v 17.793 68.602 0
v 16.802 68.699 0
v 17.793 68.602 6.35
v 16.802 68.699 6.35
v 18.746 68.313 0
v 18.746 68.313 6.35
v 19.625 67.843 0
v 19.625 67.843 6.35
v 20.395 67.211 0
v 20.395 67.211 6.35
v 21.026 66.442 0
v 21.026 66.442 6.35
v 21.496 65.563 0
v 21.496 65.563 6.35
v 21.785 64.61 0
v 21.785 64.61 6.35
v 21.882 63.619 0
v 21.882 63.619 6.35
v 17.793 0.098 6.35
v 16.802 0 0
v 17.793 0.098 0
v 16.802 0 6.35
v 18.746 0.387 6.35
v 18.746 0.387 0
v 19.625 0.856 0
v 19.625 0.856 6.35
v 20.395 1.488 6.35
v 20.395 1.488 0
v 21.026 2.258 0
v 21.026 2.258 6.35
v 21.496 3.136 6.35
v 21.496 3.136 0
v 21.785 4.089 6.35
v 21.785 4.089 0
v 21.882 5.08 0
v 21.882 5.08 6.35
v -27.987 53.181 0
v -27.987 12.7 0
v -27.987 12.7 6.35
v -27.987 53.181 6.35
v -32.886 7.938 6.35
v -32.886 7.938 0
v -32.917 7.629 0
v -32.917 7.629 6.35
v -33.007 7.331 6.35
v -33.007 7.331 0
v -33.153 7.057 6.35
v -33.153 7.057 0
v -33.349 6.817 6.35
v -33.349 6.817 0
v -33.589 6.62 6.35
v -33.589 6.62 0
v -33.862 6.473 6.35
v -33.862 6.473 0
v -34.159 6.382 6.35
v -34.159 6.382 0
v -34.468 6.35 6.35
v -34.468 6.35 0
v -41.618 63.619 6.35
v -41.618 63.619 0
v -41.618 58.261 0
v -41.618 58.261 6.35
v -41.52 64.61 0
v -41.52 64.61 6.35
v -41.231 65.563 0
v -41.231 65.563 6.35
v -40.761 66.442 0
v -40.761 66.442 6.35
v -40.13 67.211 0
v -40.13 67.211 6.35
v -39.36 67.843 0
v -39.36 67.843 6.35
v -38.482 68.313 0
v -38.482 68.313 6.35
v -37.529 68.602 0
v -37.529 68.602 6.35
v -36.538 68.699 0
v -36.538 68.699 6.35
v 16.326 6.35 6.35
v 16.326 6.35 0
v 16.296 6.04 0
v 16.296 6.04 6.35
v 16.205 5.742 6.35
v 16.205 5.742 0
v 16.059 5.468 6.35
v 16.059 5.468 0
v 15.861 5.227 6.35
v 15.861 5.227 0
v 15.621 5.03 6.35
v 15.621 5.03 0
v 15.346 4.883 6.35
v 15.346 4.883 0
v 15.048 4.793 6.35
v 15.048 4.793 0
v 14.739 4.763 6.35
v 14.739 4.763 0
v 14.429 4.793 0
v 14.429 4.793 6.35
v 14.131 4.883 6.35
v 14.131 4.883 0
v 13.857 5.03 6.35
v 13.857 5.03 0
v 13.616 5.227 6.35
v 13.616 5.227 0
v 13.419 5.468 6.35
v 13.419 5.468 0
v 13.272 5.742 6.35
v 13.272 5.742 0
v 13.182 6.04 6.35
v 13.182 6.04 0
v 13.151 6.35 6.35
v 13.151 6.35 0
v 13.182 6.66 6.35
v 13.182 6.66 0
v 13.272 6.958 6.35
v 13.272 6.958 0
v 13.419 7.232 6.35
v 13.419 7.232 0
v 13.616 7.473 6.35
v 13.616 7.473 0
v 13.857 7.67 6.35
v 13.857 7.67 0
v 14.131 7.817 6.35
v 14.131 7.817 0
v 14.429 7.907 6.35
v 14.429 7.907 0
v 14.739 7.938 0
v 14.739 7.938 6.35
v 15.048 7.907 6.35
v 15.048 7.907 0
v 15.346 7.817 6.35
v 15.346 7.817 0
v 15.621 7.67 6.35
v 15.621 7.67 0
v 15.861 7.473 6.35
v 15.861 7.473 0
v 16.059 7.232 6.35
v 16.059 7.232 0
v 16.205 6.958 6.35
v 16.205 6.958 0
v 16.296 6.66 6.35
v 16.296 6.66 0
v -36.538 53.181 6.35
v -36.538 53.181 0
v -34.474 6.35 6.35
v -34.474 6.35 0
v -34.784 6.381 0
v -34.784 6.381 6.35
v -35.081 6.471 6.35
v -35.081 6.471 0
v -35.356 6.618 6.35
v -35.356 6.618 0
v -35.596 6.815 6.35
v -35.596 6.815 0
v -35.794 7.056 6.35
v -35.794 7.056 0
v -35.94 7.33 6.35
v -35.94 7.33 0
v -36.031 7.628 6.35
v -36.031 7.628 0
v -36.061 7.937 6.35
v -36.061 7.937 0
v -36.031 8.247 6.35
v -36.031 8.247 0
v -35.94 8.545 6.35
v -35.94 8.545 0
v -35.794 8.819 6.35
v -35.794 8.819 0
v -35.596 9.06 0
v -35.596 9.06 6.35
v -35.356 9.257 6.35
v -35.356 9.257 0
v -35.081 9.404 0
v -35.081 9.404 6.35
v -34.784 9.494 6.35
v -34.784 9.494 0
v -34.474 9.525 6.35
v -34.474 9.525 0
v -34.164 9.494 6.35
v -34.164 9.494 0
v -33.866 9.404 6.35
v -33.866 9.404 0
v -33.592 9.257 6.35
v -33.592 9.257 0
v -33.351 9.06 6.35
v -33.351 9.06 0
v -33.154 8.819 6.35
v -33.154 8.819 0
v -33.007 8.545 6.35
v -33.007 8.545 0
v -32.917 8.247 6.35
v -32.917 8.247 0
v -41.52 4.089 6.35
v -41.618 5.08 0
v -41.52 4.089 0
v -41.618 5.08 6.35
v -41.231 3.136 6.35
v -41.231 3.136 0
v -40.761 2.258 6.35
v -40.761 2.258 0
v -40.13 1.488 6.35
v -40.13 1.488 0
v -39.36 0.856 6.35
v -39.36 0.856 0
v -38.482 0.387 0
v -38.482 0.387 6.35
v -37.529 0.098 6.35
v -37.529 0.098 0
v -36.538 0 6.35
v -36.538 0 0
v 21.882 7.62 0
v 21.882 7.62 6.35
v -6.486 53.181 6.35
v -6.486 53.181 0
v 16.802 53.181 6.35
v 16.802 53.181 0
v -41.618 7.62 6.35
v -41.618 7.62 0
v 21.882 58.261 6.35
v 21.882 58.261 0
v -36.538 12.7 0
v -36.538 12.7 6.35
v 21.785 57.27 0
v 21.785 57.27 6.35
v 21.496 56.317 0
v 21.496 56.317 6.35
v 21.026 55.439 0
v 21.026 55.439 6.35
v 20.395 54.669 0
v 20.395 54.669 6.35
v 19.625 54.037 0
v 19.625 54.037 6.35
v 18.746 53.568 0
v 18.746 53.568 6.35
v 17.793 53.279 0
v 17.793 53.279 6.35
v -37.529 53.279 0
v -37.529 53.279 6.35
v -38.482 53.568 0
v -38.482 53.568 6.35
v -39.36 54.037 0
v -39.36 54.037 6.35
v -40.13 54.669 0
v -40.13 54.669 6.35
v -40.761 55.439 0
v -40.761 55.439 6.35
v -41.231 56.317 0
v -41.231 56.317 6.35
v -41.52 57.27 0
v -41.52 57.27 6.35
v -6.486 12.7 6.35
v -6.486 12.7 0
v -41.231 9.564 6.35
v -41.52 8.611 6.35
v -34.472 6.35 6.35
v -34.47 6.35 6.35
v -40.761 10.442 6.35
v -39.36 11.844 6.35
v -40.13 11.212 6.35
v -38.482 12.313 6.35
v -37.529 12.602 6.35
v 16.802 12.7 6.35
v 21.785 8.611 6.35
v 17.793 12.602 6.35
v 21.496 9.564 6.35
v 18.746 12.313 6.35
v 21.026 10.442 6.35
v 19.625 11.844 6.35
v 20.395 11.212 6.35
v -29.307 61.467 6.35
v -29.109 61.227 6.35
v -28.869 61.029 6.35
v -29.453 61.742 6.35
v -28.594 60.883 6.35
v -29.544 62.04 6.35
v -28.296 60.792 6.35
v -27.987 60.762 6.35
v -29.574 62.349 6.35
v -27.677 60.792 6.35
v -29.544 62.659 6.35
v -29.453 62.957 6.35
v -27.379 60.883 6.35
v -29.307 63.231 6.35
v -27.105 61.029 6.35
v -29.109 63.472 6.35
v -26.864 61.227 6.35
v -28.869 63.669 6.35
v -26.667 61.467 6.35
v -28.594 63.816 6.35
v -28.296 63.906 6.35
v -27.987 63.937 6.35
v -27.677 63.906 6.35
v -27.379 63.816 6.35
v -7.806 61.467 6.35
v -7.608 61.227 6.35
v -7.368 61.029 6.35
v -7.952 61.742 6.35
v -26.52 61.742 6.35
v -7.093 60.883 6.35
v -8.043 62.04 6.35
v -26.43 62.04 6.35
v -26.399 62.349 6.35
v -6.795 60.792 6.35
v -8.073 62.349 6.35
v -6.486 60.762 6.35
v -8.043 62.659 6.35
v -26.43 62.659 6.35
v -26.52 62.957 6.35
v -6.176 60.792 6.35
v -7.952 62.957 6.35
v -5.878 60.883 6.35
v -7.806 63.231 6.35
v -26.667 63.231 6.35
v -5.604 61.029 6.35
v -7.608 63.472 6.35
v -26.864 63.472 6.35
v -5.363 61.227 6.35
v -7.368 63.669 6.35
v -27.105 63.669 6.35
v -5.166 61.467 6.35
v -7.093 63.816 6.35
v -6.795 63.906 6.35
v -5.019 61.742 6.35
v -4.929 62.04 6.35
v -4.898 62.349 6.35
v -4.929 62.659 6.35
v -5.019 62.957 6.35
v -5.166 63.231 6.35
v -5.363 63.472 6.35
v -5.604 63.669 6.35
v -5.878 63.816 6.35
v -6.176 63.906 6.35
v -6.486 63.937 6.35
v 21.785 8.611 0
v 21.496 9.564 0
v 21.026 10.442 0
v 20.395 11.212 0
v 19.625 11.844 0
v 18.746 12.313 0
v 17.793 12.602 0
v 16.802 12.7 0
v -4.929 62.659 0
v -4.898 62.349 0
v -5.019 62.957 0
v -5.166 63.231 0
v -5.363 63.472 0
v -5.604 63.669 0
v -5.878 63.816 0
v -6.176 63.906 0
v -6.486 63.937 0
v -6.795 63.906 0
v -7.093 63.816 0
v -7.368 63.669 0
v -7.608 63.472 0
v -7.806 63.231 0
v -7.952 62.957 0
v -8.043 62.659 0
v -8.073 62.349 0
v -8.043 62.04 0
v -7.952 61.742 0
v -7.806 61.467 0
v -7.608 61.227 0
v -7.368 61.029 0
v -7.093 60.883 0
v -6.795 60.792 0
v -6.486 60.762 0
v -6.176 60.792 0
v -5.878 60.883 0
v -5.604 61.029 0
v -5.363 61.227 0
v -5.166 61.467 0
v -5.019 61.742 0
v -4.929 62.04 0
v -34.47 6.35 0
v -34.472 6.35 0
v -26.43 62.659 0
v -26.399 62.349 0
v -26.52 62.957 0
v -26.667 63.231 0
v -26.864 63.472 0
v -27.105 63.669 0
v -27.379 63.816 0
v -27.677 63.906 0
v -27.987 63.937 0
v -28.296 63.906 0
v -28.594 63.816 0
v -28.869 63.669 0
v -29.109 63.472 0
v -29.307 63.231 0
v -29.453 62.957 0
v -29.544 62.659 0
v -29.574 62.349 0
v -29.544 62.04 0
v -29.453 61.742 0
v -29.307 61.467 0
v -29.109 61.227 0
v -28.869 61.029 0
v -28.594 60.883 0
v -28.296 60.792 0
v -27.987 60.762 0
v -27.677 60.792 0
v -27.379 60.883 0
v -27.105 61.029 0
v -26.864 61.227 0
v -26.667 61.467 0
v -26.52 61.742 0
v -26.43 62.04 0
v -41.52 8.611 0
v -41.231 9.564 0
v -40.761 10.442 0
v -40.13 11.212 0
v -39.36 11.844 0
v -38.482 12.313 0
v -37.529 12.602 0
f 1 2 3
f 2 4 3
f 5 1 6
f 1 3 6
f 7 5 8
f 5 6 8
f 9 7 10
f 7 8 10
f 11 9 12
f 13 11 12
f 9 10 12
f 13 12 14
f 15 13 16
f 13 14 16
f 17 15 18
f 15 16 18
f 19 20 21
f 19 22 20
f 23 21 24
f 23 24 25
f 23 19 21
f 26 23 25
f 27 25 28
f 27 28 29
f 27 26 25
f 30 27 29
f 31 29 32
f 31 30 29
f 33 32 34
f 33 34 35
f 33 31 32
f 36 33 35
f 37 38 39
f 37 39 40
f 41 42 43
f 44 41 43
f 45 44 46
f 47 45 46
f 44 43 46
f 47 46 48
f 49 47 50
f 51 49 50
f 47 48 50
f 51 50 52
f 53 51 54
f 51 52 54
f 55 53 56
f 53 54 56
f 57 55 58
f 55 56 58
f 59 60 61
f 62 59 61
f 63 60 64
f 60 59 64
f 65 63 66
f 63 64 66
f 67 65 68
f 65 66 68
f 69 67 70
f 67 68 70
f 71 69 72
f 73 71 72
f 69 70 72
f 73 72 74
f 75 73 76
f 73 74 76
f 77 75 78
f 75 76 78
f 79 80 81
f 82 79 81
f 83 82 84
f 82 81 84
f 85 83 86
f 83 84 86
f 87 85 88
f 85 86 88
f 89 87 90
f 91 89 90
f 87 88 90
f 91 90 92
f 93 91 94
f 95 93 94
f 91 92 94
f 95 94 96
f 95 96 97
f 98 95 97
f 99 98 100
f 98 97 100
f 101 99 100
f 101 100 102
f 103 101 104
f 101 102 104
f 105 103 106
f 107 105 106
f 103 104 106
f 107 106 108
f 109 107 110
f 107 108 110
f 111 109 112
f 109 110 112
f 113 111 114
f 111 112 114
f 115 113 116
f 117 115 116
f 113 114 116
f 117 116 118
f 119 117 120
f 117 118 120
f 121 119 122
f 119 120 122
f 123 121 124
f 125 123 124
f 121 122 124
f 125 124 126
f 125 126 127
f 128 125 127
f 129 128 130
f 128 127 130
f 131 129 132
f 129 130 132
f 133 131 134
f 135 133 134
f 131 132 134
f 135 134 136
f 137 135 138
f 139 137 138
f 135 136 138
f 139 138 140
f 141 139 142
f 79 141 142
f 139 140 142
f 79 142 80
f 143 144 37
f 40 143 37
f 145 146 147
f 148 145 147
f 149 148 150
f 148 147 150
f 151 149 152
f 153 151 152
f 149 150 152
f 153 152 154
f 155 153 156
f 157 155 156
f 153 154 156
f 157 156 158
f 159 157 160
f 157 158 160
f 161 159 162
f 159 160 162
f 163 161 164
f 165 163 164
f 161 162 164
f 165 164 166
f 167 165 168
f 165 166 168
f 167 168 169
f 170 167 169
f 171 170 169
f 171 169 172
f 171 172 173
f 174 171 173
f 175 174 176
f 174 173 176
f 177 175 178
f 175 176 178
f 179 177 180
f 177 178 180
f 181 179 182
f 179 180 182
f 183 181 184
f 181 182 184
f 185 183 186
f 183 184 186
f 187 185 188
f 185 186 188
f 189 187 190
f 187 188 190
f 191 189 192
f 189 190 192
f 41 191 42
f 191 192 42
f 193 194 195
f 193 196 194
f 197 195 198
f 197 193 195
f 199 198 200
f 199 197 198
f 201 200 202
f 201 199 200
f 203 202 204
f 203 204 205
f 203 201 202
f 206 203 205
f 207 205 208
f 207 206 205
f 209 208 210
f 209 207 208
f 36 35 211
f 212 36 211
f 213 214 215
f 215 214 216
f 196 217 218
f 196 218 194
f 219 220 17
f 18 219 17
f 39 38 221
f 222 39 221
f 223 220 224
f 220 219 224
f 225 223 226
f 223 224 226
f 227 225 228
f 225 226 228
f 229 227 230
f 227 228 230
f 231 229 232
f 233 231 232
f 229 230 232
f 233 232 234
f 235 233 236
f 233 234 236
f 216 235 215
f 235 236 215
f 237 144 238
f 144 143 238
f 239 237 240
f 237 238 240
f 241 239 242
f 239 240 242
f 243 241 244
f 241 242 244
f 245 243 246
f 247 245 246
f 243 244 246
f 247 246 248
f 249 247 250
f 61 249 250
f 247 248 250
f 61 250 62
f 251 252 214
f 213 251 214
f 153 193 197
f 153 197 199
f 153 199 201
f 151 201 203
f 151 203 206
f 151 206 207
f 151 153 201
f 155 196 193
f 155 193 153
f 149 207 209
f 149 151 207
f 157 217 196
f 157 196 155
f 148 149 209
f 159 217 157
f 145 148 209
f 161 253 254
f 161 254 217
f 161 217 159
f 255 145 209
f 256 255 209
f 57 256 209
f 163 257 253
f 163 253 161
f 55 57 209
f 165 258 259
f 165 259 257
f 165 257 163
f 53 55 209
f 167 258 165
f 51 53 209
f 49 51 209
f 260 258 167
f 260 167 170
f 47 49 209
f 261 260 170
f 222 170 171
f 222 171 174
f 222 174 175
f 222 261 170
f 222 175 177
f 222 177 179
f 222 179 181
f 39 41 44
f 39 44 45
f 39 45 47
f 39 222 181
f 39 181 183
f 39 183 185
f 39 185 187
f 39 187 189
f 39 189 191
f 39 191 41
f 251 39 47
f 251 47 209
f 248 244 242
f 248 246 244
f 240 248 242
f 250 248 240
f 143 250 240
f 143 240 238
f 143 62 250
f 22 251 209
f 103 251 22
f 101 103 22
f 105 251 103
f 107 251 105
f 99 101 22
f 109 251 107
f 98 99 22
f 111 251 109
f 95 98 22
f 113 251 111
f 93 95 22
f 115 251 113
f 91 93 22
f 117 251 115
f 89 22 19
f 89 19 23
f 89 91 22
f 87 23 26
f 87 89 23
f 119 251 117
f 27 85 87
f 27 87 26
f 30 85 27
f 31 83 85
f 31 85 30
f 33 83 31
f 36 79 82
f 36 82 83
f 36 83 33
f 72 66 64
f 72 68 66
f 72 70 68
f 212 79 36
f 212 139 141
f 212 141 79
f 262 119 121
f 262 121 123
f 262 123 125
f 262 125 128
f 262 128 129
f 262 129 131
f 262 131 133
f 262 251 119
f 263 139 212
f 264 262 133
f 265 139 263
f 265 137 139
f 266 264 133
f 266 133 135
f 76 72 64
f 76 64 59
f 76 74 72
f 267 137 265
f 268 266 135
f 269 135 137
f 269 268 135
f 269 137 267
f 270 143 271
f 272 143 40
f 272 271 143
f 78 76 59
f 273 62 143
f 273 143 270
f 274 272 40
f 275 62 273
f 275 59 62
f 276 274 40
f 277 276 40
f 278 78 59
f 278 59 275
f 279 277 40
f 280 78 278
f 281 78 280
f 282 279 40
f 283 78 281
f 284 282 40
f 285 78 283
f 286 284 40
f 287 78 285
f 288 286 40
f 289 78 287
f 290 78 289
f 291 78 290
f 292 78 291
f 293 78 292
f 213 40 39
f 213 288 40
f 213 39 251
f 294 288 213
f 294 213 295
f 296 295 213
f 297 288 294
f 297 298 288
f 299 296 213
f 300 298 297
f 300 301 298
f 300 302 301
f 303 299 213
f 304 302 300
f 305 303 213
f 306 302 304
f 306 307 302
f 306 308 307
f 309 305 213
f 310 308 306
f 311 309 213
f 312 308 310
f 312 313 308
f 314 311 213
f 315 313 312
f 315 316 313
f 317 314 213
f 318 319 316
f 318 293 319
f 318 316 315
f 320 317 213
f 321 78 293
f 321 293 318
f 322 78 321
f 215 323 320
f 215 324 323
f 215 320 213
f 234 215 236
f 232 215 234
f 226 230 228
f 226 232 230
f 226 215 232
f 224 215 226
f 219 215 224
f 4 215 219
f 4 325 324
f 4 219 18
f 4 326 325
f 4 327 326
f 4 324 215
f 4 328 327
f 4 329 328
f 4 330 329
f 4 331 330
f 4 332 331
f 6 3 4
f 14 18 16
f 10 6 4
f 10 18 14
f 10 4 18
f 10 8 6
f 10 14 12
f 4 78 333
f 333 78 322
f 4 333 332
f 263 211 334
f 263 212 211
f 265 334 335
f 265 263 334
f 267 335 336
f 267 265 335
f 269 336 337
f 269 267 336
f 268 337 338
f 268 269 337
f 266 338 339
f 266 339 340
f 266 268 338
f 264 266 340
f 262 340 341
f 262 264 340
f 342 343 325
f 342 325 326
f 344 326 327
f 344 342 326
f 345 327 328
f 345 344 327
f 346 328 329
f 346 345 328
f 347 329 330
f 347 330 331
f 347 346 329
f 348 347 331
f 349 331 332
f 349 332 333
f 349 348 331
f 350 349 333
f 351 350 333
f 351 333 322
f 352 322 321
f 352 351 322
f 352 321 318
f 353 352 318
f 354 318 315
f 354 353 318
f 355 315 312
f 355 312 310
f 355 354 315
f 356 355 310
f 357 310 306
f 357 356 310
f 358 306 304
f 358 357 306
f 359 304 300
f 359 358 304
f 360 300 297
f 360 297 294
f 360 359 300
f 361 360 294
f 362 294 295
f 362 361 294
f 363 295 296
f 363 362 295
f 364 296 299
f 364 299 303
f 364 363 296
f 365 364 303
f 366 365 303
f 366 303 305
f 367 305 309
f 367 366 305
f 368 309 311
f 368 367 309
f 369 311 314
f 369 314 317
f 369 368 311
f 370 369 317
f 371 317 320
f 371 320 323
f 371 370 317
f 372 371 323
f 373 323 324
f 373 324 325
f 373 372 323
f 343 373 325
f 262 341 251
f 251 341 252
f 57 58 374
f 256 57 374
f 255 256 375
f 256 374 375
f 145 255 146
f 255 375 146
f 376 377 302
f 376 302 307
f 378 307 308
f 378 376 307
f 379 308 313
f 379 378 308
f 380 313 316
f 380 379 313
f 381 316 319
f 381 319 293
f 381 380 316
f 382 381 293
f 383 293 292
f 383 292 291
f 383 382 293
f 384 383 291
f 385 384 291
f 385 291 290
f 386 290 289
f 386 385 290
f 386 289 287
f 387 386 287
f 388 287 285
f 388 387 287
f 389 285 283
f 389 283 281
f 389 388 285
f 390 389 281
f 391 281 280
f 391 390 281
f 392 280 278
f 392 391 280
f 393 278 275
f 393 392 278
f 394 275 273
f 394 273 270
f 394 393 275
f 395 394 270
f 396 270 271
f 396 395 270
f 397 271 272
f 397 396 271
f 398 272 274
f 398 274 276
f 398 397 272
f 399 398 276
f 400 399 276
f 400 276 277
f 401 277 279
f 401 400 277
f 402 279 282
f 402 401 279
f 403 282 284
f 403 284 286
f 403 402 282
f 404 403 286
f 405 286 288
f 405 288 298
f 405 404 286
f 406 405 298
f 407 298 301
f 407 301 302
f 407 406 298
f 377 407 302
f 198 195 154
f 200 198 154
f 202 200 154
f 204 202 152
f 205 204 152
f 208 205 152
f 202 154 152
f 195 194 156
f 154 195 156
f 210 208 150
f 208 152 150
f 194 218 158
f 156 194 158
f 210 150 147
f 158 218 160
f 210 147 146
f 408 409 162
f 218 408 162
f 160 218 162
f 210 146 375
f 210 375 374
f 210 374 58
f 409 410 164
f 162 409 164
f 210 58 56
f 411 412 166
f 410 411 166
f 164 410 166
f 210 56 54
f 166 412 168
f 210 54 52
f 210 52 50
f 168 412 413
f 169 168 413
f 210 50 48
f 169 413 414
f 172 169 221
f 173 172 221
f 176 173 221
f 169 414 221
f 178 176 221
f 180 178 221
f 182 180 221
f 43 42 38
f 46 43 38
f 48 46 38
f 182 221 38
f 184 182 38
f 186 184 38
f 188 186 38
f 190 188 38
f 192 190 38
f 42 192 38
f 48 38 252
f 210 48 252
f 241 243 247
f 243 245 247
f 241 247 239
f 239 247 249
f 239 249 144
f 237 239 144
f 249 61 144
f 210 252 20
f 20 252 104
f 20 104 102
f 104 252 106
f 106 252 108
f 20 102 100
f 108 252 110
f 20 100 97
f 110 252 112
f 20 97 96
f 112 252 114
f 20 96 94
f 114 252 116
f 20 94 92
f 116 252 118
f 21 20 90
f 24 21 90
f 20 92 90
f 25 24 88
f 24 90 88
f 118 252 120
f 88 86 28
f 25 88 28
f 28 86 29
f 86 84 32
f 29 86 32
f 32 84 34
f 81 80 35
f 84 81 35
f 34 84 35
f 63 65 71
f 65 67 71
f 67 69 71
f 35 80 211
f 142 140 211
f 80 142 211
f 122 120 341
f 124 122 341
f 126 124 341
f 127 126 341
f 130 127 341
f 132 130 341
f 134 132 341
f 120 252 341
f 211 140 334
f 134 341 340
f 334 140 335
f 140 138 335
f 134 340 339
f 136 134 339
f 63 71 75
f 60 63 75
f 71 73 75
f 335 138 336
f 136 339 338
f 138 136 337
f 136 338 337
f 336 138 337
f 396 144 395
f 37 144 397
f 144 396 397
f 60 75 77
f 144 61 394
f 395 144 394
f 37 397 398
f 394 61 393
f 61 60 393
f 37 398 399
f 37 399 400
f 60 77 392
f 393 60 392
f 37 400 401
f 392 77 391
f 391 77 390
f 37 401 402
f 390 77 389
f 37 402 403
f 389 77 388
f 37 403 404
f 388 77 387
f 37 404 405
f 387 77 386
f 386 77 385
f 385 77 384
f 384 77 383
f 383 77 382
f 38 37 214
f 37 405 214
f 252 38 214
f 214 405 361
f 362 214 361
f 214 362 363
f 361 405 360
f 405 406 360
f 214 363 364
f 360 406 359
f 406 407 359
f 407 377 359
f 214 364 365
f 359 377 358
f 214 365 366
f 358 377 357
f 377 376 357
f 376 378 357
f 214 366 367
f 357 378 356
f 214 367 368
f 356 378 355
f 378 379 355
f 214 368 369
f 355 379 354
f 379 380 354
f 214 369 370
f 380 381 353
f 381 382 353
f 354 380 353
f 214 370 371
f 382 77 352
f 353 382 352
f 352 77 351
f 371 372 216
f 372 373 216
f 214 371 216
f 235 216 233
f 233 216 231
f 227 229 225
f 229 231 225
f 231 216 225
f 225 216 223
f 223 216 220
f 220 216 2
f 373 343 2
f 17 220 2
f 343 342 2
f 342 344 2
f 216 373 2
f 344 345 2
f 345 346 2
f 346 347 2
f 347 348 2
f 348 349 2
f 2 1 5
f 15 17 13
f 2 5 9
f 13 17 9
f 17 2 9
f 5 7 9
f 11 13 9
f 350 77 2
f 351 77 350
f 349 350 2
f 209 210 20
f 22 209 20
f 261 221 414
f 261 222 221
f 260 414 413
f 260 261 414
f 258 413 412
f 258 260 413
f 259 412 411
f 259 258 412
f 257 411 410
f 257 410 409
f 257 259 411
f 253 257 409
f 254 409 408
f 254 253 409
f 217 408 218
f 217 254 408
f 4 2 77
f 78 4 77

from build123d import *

# Parameters (mm, degrees)
F0_R     = 1.5875
F0_W     = 21.5011
F0_H     = 40.48125
F1_DEPTH = 6.35
F2_R     = 5.08


with BuildPart() as f1:
    # F0 (on Top) → F1 (new body)
    with BuildSketch(Plane.XY):
        Polygon((-41.617566, 53.18125), (-27.986656, 53.18125), (-6.485556, 53.18125), (21.882434, 53.18125), (21.882434, 68.69938), (-41.617566, 68.69938), align=None)
        with Locations((-27.986656, 62.34938)):
            Circle(F0_R, mode=Mode.SUBTRACT)
        with Locations((-6.485556, 62.34938)):
            Circle(F0_R, mode=Mode.SUBTRACT)
        with Locations((-17.236106, 32.940625)):
            Rectangle(F0_W, F0_H)
        Polygon((-41.617566, 12.7), (-41.617566, 0), (21.882434, 0), (21.882434, 12.7), (-6.485556, 12.7), (-27.986656, 12.7), align=None)
        with BuildLine():
            ThreePointArc((-32.886316, 7.9375), (-33.349189, 6.817068), (-34.467883, 6.350011))
            ThreePointArc((-34.467883, 6.350011), (-34.47085, 6.350003), (-34.473816, 6.35))
            ThreePointArc((-34.473816, 6.35), (-35.596348, 9.060032), (-32.886316, 7.9375))
        make_face(mode=Mode.SUBTRACT)
        with BuildLine():
            ThreePointArc((13.151184, 6.35), (14.738684, 7.9375), (16.326184, 6.35))
            ThreePointArc((16.326184, 6.35), (14.738684, 4.7625), (13.151184, 6.35))
        make_face(mode=Mode.SUBTRACT)
    extrude(amount=F1_DEPTH)

    # F2
    f2_edges = [f1.edges().sort_by_distance(p)[0] for p in [
        (21.882434, 0, 3.175),
        (21.882434, 12.7, 3.175),
        (-41.617566, 0, 3.175),
        (-41.617566, 12.7, 3.175),
        (21.882434, 53.18125, 3.175),
        (21.882434, 68.69938, 3.175),
        (-41.617566, 53.18125, 3.175),
        (-41.617566, 68.69938, 3.175),
    ]]
    fillet(f2_edges, radius=F2_R)


solid = f1.part
